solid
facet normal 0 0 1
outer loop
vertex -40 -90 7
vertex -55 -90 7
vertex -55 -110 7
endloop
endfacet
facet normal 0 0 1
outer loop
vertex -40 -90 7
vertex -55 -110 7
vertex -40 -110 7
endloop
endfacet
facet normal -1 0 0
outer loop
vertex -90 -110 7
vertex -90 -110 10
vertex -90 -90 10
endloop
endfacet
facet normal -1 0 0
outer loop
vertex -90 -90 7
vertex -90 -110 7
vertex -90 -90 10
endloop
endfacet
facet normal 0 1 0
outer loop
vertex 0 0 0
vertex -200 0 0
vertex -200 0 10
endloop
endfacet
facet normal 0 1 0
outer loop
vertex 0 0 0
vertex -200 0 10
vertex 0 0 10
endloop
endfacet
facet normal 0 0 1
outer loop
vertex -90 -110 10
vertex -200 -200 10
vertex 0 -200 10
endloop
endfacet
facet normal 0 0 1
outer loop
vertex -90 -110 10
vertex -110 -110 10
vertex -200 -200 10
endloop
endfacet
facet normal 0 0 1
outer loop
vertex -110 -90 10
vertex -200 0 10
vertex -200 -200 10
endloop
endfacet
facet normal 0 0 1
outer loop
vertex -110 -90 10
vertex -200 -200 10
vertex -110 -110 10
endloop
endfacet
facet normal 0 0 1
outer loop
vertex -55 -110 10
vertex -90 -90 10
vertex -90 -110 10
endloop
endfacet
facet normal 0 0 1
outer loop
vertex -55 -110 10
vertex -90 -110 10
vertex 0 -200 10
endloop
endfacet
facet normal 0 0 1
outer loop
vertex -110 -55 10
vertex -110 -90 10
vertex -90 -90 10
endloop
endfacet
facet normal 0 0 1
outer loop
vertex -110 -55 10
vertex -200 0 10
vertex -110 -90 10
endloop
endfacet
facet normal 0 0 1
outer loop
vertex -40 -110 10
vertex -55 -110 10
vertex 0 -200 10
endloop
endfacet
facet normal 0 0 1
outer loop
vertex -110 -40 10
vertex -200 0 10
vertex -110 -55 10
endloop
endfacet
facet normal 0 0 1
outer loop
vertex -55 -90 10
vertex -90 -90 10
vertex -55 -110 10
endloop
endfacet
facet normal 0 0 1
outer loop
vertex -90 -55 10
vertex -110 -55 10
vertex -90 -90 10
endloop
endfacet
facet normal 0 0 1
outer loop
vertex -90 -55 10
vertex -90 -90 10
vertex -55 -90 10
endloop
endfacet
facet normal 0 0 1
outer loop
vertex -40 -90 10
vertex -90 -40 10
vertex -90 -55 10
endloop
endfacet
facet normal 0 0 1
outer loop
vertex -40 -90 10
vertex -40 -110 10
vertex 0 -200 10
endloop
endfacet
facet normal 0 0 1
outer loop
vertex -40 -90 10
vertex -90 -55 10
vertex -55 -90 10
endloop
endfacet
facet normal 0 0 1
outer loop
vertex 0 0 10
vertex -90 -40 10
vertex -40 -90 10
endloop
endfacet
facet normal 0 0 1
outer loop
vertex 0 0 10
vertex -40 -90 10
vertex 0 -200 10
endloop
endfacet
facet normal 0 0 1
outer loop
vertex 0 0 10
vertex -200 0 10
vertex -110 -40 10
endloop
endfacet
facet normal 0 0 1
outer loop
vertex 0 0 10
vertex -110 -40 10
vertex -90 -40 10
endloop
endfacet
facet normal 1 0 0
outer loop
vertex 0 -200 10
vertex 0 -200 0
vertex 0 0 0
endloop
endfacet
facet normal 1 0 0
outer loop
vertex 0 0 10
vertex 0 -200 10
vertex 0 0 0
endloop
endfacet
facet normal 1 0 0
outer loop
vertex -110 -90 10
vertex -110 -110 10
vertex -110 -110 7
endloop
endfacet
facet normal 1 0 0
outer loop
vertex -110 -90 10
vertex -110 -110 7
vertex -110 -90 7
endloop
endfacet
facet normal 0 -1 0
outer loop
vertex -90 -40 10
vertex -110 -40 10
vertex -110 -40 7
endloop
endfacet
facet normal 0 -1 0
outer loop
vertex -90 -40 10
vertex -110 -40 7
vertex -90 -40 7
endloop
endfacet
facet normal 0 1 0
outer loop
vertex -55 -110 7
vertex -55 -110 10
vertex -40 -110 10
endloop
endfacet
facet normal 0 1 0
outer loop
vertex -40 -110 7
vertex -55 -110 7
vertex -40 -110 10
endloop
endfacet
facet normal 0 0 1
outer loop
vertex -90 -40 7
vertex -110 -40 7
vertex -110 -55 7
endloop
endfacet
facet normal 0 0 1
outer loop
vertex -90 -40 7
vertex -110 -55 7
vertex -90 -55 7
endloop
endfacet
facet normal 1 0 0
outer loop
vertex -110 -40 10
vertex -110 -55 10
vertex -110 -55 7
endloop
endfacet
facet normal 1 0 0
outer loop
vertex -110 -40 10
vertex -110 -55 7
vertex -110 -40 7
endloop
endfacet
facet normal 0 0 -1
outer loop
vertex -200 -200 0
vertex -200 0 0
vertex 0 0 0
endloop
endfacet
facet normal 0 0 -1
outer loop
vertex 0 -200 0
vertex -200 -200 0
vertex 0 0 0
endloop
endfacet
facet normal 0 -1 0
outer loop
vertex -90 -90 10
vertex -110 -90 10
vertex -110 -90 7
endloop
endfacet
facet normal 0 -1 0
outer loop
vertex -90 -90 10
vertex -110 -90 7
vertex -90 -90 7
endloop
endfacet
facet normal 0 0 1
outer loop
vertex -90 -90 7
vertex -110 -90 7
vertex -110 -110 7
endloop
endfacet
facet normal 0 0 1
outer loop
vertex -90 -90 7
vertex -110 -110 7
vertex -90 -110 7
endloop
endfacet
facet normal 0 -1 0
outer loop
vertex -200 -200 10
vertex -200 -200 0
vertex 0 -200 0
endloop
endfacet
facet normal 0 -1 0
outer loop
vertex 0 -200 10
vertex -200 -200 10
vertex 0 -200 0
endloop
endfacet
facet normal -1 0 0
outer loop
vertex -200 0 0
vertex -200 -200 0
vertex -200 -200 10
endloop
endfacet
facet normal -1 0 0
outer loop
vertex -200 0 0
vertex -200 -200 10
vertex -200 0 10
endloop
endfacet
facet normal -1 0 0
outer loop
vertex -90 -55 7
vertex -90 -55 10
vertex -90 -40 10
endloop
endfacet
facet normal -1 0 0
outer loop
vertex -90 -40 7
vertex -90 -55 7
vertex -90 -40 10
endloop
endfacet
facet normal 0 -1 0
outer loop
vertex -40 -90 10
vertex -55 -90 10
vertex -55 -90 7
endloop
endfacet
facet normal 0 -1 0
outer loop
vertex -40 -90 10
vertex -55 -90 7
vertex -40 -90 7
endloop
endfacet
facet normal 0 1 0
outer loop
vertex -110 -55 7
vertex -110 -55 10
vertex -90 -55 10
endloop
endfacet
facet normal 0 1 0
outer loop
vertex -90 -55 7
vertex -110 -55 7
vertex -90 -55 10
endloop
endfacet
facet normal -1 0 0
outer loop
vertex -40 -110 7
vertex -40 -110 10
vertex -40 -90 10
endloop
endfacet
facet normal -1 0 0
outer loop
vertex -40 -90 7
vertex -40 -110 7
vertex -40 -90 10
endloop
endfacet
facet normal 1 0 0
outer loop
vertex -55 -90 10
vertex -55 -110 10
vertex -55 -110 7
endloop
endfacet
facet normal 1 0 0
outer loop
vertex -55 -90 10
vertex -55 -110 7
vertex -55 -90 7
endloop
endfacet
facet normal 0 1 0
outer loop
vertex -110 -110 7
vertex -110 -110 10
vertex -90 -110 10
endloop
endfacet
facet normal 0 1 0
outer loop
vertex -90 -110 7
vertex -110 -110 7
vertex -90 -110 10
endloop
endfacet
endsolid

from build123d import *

# Parameters (mm, degrees)
SKETCH1_W           = 200
SKETCH1_H           = 200
BOSS_EXTRUDE1_DEPTH = 10
SKETCH2_W           = 20
SKETCH2_H           = 20
CUT_EXTRUDE2_DEPTH  = 3
SKETCH3_W           = 20
SKETCH3_H           = 15
SKETCH3_W_2         = 15
SKETCH3_H_2         = 20
CUT_EXTRUDE3_DEPTH  = 3


with BuildPart() as part:
    # Sketch1 → Boss-Extrude1 (new body)
    with BuildSketch(Plane.XY):
        with Locations((-100, -100)):
            Rectangle(SKETCH1_W, SKETCH1_H)
    extrude(amount=BOSS_EXTRUDE1_DEPTH)

    # Sketch2 → Cut-Extrude2 (cut)
    with BuildSketch(Plane.XY.offset(10)):
        with Locations((-100, -100)):
            Rectangle(SKETCH2_W, SKETCH2_H)
    extrude(amount=-CUT_EXTRUDE2_DEPTH, mode=Mode.SUBTRACT)

    # Sketch3 → Cut-Extrude3 (cut)
    with BuildSketch(Plane.XY.offset(10)):
        with Locations((-100, -47.5)):
            Rectangle(SKETCH3_W, SKETCH3_H)
        with Locations((-47.5, -100)):
            Rectangle(SKETCH3_W_2, SKETCH3_H_2)
    extrude(amount=-CUT_EXTRUDE3_DEPTH, mode=Mode.SUBTRACT)


solid = part.part
